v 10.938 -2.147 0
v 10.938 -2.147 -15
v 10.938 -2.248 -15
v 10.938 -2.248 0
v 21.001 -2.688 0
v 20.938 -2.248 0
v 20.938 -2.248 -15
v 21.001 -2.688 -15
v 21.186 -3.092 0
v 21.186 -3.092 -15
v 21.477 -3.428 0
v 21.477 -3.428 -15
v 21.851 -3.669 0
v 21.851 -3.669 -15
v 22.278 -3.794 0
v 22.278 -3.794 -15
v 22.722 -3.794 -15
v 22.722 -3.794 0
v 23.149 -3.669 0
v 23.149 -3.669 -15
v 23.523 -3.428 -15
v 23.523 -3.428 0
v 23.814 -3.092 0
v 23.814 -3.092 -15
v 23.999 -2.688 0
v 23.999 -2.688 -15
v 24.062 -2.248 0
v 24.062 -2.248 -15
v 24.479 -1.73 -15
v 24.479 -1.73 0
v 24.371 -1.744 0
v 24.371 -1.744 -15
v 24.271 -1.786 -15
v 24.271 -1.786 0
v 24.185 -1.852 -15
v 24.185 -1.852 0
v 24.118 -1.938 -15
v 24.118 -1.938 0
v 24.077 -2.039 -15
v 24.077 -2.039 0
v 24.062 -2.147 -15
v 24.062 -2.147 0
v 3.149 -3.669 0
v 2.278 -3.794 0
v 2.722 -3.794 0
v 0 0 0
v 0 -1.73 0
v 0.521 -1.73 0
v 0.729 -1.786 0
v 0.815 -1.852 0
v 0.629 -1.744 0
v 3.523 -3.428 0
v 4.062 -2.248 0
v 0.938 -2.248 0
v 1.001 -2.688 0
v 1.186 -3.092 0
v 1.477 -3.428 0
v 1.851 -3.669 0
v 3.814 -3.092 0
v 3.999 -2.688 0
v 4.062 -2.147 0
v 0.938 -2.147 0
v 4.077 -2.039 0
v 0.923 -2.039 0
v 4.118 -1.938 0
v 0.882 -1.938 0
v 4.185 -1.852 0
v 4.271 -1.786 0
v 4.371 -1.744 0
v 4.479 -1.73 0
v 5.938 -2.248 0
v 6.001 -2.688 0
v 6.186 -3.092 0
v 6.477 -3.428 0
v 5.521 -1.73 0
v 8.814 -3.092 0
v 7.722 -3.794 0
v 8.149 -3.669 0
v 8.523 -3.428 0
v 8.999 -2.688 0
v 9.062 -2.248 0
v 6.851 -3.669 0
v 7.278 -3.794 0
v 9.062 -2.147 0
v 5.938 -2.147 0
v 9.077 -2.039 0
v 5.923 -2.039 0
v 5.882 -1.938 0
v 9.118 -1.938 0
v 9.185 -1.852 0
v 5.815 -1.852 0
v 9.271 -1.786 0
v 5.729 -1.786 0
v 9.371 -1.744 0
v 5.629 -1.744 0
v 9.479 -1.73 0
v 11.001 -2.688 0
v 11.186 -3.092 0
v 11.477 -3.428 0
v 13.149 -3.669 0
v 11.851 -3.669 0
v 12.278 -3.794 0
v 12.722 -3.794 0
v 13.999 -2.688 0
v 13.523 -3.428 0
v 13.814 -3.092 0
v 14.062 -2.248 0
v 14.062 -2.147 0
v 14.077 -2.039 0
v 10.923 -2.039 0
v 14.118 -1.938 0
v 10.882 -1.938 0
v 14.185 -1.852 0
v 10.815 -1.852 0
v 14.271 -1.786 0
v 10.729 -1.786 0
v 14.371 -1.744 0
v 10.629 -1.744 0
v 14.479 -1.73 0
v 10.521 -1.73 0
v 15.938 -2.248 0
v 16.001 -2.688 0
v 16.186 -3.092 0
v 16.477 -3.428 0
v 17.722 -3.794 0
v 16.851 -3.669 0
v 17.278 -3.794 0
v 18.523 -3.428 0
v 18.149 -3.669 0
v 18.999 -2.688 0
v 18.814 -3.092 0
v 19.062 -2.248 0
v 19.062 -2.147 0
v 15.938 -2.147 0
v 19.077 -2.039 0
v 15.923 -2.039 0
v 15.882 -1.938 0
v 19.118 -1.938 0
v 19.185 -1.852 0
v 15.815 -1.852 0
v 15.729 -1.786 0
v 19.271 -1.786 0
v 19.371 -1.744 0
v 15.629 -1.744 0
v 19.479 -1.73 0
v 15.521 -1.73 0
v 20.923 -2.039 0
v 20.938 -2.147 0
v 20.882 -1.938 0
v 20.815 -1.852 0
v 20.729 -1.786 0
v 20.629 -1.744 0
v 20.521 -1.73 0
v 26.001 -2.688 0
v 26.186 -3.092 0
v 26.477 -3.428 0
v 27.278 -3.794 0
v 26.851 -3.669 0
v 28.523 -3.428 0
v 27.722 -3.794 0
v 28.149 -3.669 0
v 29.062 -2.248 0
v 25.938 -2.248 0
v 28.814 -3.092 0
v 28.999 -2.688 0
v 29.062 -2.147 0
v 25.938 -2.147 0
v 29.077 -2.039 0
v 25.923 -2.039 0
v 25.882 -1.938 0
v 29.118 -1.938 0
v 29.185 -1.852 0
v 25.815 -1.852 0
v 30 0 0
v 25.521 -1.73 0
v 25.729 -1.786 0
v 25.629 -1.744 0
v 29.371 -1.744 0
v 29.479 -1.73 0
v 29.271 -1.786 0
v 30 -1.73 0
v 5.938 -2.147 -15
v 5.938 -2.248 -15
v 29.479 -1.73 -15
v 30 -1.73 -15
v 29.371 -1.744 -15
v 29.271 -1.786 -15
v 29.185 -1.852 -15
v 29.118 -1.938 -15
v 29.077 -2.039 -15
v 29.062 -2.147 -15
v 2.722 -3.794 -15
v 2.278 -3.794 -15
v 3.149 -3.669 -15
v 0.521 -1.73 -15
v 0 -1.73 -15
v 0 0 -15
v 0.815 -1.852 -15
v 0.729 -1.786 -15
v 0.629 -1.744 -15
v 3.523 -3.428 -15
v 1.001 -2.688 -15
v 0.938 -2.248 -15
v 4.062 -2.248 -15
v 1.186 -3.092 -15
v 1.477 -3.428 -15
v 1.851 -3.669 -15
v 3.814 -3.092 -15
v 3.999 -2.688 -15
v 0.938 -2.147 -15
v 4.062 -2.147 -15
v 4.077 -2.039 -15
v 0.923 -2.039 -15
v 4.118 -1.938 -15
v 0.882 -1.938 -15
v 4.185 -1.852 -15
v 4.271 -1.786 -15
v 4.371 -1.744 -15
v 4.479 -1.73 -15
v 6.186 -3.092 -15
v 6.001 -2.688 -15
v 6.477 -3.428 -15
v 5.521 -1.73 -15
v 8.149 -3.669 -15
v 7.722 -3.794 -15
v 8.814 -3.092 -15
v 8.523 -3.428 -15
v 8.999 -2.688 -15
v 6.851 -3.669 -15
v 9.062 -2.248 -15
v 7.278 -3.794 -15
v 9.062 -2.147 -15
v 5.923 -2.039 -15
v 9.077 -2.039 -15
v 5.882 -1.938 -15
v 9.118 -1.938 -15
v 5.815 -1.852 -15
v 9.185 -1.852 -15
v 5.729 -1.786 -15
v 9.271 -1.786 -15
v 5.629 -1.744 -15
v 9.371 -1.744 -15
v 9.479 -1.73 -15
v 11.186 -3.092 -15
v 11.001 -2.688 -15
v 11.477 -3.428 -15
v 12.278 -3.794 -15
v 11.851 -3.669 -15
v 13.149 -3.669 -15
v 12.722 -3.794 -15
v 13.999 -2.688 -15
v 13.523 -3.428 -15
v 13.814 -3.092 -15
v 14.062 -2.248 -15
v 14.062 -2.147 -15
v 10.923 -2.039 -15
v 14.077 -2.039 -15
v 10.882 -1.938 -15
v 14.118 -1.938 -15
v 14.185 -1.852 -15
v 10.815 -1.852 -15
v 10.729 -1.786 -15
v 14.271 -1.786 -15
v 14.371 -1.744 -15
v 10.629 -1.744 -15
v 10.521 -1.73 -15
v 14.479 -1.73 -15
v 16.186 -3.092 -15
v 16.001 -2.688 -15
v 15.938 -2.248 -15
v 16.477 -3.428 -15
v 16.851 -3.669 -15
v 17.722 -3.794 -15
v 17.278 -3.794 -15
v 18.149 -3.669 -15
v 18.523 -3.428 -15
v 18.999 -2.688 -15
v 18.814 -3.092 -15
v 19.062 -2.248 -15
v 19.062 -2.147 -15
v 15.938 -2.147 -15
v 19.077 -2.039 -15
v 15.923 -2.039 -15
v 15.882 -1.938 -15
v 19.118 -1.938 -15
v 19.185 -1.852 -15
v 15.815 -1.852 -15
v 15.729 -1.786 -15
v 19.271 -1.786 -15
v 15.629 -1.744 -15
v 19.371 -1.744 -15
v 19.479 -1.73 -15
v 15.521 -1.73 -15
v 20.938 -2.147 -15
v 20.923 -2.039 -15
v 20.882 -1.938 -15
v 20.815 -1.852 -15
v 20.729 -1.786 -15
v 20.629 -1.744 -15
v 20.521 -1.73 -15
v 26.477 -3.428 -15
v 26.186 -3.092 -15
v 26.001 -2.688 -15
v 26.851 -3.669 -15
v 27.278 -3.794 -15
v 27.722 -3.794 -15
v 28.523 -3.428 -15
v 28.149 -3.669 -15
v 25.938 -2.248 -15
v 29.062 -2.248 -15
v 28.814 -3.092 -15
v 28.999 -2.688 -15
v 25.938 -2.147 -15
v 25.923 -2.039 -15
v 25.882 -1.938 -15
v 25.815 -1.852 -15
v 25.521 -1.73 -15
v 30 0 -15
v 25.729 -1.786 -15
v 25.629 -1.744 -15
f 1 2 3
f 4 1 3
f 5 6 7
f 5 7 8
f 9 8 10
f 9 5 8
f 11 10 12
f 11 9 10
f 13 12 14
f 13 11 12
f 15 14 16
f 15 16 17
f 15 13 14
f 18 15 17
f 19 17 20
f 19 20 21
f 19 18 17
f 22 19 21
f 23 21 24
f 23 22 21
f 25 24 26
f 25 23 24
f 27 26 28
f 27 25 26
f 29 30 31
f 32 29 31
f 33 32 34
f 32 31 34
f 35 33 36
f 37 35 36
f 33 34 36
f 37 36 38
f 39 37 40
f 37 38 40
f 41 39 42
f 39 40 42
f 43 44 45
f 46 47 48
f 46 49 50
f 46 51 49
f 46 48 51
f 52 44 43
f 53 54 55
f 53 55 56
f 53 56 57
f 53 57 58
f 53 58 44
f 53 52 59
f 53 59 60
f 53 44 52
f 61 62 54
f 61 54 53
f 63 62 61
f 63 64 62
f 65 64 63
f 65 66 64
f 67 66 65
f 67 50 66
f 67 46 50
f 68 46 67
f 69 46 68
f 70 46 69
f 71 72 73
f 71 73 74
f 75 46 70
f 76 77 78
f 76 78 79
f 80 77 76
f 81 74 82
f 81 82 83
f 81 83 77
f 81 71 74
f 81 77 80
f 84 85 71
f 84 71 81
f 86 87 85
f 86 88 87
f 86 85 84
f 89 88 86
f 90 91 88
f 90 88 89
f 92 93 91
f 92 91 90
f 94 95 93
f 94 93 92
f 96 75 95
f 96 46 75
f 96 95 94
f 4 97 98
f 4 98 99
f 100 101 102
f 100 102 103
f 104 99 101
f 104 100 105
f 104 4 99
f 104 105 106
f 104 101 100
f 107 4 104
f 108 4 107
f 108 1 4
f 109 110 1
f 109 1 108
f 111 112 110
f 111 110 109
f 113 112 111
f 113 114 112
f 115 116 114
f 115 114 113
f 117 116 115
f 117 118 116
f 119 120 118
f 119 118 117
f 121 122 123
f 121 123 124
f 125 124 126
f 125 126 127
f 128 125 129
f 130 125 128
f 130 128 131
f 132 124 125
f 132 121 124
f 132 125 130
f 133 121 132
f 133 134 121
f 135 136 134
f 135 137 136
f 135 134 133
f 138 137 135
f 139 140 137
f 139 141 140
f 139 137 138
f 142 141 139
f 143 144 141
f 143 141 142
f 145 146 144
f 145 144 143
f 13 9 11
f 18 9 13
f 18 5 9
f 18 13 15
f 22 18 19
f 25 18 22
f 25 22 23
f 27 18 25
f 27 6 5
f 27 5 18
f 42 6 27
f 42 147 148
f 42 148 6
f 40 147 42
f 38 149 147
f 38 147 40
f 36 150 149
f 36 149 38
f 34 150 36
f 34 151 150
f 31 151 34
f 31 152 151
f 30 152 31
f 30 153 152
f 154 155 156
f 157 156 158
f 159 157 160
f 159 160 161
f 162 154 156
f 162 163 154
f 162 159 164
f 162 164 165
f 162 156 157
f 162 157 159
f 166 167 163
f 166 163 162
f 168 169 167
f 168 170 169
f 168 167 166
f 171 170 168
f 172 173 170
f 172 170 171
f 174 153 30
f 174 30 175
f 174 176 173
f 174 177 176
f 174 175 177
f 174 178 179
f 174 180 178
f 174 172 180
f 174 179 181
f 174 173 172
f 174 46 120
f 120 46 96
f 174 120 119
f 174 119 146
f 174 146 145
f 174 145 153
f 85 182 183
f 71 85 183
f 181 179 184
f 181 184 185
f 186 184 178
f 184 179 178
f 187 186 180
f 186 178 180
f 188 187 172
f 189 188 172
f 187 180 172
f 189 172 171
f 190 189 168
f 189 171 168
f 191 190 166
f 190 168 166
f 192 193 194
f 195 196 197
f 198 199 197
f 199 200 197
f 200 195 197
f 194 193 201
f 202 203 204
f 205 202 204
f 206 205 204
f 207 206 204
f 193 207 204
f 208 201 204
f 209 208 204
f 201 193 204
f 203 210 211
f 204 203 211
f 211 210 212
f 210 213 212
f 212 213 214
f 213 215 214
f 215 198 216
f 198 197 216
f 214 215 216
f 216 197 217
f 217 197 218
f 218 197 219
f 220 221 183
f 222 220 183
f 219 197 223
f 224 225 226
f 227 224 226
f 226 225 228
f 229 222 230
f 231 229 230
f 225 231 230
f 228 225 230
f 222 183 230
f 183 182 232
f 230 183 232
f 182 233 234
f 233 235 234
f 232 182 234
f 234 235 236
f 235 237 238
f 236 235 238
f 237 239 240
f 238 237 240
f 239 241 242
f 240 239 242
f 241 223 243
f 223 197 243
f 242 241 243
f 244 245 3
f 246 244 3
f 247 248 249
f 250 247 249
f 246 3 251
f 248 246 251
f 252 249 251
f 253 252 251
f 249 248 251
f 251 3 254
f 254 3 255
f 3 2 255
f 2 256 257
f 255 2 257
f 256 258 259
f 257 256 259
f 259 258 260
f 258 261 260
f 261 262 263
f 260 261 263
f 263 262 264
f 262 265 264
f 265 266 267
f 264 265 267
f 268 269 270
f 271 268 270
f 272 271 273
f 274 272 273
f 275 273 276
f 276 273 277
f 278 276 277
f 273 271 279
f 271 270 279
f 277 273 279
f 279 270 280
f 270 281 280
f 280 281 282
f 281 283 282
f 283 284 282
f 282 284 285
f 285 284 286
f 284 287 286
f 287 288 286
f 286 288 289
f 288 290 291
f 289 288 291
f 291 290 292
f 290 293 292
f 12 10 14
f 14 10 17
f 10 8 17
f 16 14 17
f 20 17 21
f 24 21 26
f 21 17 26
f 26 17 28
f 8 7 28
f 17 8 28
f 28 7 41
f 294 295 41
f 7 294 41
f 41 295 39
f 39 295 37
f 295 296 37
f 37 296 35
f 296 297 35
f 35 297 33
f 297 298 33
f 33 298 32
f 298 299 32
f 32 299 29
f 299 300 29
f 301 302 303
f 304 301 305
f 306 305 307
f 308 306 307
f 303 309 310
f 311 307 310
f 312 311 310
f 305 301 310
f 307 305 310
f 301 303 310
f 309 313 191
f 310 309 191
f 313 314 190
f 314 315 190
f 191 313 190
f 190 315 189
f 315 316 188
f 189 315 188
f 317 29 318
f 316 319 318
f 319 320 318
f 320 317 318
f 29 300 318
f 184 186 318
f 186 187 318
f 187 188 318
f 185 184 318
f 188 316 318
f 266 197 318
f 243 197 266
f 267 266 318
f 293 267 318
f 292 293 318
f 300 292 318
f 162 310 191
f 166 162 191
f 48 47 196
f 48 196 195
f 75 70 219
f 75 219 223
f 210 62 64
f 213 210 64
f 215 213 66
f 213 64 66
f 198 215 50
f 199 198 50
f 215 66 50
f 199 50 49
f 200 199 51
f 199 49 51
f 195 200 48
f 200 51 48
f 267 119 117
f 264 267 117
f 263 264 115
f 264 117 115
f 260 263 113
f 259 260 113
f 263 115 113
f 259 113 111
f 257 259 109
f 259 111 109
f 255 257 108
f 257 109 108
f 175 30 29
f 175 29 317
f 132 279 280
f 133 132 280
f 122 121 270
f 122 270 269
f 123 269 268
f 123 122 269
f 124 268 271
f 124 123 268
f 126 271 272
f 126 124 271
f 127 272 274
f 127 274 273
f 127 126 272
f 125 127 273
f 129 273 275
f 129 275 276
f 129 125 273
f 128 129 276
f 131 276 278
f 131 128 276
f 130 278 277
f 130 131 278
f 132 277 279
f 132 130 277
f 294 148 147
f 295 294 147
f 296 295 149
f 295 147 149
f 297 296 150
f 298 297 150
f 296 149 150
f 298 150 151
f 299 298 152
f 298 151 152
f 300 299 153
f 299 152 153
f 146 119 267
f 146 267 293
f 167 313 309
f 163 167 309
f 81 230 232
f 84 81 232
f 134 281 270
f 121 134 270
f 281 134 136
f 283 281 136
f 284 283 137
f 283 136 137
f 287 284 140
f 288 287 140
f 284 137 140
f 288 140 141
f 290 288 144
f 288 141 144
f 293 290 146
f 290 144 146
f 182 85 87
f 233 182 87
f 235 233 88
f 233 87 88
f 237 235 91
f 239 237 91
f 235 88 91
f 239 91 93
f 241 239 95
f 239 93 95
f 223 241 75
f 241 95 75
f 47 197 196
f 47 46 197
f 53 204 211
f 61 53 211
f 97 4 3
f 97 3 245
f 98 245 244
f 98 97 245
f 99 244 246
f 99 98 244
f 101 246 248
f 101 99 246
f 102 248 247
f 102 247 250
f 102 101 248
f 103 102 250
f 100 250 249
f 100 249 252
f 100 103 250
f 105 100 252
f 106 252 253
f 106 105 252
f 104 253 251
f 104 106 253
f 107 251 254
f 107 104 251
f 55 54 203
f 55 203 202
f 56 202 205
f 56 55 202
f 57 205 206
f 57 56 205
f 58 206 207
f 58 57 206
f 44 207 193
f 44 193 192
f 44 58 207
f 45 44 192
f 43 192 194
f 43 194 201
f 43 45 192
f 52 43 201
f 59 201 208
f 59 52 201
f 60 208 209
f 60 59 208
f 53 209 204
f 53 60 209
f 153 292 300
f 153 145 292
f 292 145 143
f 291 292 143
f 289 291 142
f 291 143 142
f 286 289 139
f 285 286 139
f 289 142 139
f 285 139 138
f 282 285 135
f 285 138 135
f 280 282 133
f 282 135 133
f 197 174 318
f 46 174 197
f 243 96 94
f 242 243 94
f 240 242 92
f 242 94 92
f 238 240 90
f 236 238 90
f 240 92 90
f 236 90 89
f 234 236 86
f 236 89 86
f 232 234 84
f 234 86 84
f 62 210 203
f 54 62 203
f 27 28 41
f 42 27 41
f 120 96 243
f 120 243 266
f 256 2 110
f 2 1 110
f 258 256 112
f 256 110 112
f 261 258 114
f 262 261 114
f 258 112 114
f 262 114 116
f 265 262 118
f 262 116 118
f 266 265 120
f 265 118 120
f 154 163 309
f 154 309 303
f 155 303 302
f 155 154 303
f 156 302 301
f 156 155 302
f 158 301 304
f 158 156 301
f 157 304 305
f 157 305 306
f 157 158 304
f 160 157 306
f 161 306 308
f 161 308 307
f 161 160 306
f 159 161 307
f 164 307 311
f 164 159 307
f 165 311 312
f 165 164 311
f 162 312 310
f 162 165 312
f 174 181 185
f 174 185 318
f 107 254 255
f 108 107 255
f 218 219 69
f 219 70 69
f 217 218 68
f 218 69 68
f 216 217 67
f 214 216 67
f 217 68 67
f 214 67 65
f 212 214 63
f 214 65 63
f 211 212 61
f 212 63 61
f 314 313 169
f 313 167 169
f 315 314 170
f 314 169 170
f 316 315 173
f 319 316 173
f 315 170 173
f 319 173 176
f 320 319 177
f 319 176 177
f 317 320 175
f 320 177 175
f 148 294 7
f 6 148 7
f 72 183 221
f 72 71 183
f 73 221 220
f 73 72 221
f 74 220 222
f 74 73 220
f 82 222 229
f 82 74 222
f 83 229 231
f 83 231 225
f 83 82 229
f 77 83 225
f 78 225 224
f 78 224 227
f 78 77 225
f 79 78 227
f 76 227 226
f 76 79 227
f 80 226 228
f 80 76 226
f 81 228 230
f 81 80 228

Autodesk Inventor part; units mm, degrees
ref_plane "YZ Plane" through (0, 0, 0) normal (1, 0, 0) x (0, 1, 0)
ref_plane "XZ Plane" through (0, 0, 0) normal (0, 1, 0) x (-1, 0, 0)
ref_plane "XY Plane" through (0, 0, 0) normal (0, 0, 1) x (1, 0, 0)
sketch "Sketch1" plane through (0, 0, 0) normal (0, 0, 1) x (1, 0, 0)
  line L0 (0.9375, -2.1467) -> (0.9375, -2.2475)
  arc A0 (0.9375, -2.2475) -> (4.0625, -2.2475) centre (2.5, -2.2475) ccw
  line L1 (4.0625, -2.2475) -> (4.0625, -2.1467)
  arc A1 (4.4792, -1.73) -> (4.0625, -2.1467) centre (4.4792, -2.1467) ccw
  line L2 (4.4792, -1.73) -> (5.5208, -1.73)
  arc A2 (5.9375, -2.1467) -> (5.5208, -1.73) centre (5.5208, -2.1467) ccw
  line L3 (5.9375, -2.1467) -> (5.9375, -2.2475)
  arc A3 (5.9375, -2.2475) -> (9.0625, -2.2475) centre (7.5, -2.2475) ccw
  line L4 (9.0625, -2.2475) -> (9.0625, -2.1467)
  arc A4 (9.4792, -1.73) -> (9.0625, -2.1467) centre (9.4792, -2.1467) ccw
  line L5 (9.4792, -1.73) -> (10.5208, -1.73)
  arc A5 (10.9375, -2.1467) -> (10.5208, -1.73) centre (10.5208, -2.1467) ccw
  line L6 (10.9375, -2.1467) -> (10.9375, -2.2475)
  arc A6 (10.9375, -2.2475) -> (14.0625, -2.2475) centre (12.5, -2.2475) ccw
  line L7 (14.0625, -2.2475) -> (14.0625, -2.1467)
  arc A7 (14.4792, -1.73) -> (14.0625, -2.1467) centre (14.4792, -2.1467) ccw
  line L8 (14.4792, -1.73) -> (15.5208, -1.73)
  arc A8 (15.9375, -2.1467) -> (15.5208, -1.73) centre (15.5208, -2.1467) ccw
  line L9 (15.9375, -2.1467) -> (15.9375, -2.2475)
  arc A9 (15.9375, -2.2475) -> (19.0625, -2.2475) centre (17.5, -2.2475) ccw
  line L10 (19.0625, -2.2475) -> (19.0625, -2.1467)
  arc A10 (19.4792, -1.73) -> (19.0625, -2.1467) centre (19.4792, -2.1467) ccw
  line L11 (19.4792, -1.73) -> (20.5208, -1.73)
  arc A11 (20.9375, -2.1467) -> (20.5208, -1.73) centre (20.5208, -2.1467) ccw
  line L12 (20.9375, -2.1467) -> (20.9375, -2.2475)
  arc A12 (20.9375, -2.2475) -> (24.0625, -2.2475) centre (22.5, -2.2475) ccw
  line L13 (24.0625, -2.2475) -> (24.0625, -2.1467)
  arc A13 (24.4792, -1.73) -> (24.0625, -2.1467) centre (24.4792, -2.1467) ccw
  line L14 (24.4792, -1.73) -> (25.5208, -1.73)
  arc A14 (25.9375, -2.1467) -> (25.5208, -1.73) centre (25.5208, -2.1467) ccw
  line L15 (25.9375, -2.1467) -> (25.9375, -2.2475)
  arc A15 (25.9375, -2.2475) -> (29.0625, -2.2475) centre (27.5, -2.2475) ccw
  line L16 (29.0625, -2.2475) -> (29.0625, -2.1467)
  arc A16 (29.4792, -1.73) -> (29.0625, -2.1467) centre (29.4792, -2.1467) ccw
  line L17 (29.4792, -1.73) -> (30, -1.73)
  line L18 (30, -1.73) -> (30, 0)
  line L19 (30, 0) -> (0, 0)
  line L20 (0, 0) -> (0, -1.73)
  line L21 (0, -1.73) -> (0.5208, -1.73)
  arc A17 (0.9375, -2.1467) -> (0.5208, -1.73) centre (0.5208, -2.1467) ccw
  point P0 (25, 0)
extrude "Extrusion1" add sketch "Sketch1" against normal blind 15
properties part number "520-5M-15" material "Nylon 6/6"
